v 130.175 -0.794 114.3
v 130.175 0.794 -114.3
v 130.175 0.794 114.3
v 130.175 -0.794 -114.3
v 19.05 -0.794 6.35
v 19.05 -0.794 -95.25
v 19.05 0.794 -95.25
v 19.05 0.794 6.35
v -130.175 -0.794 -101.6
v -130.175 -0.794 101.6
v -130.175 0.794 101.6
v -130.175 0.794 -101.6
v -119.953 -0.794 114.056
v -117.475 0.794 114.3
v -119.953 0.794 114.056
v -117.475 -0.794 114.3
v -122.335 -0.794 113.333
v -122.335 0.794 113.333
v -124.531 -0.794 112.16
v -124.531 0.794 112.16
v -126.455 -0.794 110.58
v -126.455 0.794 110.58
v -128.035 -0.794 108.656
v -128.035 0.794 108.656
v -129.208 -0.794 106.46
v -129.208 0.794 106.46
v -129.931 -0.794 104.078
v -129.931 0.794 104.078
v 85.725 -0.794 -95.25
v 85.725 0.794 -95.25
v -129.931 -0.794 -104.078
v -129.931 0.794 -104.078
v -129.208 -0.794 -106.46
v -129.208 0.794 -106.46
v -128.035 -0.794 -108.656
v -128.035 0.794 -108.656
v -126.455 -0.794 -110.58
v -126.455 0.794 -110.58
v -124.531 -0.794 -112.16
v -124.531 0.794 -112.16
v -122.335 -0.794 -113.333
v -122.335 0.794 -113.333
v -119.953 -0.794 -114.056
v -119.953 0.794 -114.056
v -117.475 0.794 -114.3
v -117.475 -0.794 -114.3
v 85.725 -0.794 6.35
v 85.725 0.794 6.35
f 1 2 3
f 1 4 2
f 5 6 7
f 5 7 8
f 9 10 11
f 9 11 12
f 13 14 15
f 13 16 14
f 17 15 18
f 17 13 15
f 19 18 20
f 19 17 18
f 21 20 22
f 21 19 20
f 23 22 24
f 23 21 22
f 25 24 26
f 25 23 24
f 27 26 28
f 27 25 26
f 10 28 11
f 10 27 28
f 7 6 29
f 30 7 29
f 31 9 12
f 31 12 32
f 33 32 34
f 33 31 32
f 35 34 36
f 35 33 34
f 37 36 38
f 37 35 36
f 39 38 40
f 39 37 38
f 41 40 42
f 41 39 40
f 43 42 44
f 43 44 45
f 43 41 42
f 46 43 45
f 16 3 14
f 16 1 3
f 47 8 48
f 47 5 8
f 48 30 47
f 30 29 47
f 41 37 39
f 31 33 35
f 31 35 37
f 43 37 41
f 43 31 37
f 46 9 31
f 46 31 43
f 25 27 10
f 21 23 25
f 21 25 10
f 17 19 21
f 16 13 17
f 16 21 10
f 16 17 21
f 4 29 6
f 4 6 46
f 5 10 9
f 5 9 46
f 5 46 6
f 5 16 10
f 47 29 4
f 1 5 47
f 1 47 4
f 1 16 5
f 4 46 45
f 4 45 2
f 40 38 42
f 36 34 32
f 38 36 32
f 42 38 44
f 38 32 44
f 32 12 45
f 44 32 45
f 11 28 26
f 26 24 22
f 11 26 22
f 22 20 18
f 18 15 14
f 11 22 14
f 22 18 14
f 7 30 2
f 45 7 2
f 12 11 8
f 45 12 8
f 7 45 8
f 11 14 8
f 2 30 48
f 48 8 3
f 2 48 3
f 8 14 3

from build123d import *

# Parameters (mm, degrees)
F0_W     = 66.675
F0_H     = 101.6
F1_DEPTH = 0.79375


with BuildPart() as f1:
    # F0 (on Front) → F1 (new body, symmetric)
    with BuildSketch(Plane.XZ):
        with BuildLine():
            Line((117.475, 114.3), (-117.475, 114.3))
            ThreePointArc((-117.475, 114.3), (-126.455256, 110.580256), (-130.175, 101.6))
            Line((-130.175, 101.6), (-130.175, -101.6))
            ThreePointArc((-130.175, -101.6), (-126.455256, -110.580256), (-117.475, -114.3))
            Line((-117.475, -114.3), (117.475, -114.3))
            Line((117.475, -114.3), (130.175, -114.3))
            Line((130.175, -114.3), (130.175, -101.6))
            Line((130.175, -101.6), (130.175, 101.6))
            Line((130.175, 101.6), (130.175, 114.3))
            Line((130.175, 114.3), (117.475, 114.3))
        make_face()
        with Locations((52.3875, -44.45)):
            Rectangle(F0_W, F0_H, mode=Mode.SUBTRACT)
    extrude(amount=F1_DEPTH, both=True)


solid = f1.part
